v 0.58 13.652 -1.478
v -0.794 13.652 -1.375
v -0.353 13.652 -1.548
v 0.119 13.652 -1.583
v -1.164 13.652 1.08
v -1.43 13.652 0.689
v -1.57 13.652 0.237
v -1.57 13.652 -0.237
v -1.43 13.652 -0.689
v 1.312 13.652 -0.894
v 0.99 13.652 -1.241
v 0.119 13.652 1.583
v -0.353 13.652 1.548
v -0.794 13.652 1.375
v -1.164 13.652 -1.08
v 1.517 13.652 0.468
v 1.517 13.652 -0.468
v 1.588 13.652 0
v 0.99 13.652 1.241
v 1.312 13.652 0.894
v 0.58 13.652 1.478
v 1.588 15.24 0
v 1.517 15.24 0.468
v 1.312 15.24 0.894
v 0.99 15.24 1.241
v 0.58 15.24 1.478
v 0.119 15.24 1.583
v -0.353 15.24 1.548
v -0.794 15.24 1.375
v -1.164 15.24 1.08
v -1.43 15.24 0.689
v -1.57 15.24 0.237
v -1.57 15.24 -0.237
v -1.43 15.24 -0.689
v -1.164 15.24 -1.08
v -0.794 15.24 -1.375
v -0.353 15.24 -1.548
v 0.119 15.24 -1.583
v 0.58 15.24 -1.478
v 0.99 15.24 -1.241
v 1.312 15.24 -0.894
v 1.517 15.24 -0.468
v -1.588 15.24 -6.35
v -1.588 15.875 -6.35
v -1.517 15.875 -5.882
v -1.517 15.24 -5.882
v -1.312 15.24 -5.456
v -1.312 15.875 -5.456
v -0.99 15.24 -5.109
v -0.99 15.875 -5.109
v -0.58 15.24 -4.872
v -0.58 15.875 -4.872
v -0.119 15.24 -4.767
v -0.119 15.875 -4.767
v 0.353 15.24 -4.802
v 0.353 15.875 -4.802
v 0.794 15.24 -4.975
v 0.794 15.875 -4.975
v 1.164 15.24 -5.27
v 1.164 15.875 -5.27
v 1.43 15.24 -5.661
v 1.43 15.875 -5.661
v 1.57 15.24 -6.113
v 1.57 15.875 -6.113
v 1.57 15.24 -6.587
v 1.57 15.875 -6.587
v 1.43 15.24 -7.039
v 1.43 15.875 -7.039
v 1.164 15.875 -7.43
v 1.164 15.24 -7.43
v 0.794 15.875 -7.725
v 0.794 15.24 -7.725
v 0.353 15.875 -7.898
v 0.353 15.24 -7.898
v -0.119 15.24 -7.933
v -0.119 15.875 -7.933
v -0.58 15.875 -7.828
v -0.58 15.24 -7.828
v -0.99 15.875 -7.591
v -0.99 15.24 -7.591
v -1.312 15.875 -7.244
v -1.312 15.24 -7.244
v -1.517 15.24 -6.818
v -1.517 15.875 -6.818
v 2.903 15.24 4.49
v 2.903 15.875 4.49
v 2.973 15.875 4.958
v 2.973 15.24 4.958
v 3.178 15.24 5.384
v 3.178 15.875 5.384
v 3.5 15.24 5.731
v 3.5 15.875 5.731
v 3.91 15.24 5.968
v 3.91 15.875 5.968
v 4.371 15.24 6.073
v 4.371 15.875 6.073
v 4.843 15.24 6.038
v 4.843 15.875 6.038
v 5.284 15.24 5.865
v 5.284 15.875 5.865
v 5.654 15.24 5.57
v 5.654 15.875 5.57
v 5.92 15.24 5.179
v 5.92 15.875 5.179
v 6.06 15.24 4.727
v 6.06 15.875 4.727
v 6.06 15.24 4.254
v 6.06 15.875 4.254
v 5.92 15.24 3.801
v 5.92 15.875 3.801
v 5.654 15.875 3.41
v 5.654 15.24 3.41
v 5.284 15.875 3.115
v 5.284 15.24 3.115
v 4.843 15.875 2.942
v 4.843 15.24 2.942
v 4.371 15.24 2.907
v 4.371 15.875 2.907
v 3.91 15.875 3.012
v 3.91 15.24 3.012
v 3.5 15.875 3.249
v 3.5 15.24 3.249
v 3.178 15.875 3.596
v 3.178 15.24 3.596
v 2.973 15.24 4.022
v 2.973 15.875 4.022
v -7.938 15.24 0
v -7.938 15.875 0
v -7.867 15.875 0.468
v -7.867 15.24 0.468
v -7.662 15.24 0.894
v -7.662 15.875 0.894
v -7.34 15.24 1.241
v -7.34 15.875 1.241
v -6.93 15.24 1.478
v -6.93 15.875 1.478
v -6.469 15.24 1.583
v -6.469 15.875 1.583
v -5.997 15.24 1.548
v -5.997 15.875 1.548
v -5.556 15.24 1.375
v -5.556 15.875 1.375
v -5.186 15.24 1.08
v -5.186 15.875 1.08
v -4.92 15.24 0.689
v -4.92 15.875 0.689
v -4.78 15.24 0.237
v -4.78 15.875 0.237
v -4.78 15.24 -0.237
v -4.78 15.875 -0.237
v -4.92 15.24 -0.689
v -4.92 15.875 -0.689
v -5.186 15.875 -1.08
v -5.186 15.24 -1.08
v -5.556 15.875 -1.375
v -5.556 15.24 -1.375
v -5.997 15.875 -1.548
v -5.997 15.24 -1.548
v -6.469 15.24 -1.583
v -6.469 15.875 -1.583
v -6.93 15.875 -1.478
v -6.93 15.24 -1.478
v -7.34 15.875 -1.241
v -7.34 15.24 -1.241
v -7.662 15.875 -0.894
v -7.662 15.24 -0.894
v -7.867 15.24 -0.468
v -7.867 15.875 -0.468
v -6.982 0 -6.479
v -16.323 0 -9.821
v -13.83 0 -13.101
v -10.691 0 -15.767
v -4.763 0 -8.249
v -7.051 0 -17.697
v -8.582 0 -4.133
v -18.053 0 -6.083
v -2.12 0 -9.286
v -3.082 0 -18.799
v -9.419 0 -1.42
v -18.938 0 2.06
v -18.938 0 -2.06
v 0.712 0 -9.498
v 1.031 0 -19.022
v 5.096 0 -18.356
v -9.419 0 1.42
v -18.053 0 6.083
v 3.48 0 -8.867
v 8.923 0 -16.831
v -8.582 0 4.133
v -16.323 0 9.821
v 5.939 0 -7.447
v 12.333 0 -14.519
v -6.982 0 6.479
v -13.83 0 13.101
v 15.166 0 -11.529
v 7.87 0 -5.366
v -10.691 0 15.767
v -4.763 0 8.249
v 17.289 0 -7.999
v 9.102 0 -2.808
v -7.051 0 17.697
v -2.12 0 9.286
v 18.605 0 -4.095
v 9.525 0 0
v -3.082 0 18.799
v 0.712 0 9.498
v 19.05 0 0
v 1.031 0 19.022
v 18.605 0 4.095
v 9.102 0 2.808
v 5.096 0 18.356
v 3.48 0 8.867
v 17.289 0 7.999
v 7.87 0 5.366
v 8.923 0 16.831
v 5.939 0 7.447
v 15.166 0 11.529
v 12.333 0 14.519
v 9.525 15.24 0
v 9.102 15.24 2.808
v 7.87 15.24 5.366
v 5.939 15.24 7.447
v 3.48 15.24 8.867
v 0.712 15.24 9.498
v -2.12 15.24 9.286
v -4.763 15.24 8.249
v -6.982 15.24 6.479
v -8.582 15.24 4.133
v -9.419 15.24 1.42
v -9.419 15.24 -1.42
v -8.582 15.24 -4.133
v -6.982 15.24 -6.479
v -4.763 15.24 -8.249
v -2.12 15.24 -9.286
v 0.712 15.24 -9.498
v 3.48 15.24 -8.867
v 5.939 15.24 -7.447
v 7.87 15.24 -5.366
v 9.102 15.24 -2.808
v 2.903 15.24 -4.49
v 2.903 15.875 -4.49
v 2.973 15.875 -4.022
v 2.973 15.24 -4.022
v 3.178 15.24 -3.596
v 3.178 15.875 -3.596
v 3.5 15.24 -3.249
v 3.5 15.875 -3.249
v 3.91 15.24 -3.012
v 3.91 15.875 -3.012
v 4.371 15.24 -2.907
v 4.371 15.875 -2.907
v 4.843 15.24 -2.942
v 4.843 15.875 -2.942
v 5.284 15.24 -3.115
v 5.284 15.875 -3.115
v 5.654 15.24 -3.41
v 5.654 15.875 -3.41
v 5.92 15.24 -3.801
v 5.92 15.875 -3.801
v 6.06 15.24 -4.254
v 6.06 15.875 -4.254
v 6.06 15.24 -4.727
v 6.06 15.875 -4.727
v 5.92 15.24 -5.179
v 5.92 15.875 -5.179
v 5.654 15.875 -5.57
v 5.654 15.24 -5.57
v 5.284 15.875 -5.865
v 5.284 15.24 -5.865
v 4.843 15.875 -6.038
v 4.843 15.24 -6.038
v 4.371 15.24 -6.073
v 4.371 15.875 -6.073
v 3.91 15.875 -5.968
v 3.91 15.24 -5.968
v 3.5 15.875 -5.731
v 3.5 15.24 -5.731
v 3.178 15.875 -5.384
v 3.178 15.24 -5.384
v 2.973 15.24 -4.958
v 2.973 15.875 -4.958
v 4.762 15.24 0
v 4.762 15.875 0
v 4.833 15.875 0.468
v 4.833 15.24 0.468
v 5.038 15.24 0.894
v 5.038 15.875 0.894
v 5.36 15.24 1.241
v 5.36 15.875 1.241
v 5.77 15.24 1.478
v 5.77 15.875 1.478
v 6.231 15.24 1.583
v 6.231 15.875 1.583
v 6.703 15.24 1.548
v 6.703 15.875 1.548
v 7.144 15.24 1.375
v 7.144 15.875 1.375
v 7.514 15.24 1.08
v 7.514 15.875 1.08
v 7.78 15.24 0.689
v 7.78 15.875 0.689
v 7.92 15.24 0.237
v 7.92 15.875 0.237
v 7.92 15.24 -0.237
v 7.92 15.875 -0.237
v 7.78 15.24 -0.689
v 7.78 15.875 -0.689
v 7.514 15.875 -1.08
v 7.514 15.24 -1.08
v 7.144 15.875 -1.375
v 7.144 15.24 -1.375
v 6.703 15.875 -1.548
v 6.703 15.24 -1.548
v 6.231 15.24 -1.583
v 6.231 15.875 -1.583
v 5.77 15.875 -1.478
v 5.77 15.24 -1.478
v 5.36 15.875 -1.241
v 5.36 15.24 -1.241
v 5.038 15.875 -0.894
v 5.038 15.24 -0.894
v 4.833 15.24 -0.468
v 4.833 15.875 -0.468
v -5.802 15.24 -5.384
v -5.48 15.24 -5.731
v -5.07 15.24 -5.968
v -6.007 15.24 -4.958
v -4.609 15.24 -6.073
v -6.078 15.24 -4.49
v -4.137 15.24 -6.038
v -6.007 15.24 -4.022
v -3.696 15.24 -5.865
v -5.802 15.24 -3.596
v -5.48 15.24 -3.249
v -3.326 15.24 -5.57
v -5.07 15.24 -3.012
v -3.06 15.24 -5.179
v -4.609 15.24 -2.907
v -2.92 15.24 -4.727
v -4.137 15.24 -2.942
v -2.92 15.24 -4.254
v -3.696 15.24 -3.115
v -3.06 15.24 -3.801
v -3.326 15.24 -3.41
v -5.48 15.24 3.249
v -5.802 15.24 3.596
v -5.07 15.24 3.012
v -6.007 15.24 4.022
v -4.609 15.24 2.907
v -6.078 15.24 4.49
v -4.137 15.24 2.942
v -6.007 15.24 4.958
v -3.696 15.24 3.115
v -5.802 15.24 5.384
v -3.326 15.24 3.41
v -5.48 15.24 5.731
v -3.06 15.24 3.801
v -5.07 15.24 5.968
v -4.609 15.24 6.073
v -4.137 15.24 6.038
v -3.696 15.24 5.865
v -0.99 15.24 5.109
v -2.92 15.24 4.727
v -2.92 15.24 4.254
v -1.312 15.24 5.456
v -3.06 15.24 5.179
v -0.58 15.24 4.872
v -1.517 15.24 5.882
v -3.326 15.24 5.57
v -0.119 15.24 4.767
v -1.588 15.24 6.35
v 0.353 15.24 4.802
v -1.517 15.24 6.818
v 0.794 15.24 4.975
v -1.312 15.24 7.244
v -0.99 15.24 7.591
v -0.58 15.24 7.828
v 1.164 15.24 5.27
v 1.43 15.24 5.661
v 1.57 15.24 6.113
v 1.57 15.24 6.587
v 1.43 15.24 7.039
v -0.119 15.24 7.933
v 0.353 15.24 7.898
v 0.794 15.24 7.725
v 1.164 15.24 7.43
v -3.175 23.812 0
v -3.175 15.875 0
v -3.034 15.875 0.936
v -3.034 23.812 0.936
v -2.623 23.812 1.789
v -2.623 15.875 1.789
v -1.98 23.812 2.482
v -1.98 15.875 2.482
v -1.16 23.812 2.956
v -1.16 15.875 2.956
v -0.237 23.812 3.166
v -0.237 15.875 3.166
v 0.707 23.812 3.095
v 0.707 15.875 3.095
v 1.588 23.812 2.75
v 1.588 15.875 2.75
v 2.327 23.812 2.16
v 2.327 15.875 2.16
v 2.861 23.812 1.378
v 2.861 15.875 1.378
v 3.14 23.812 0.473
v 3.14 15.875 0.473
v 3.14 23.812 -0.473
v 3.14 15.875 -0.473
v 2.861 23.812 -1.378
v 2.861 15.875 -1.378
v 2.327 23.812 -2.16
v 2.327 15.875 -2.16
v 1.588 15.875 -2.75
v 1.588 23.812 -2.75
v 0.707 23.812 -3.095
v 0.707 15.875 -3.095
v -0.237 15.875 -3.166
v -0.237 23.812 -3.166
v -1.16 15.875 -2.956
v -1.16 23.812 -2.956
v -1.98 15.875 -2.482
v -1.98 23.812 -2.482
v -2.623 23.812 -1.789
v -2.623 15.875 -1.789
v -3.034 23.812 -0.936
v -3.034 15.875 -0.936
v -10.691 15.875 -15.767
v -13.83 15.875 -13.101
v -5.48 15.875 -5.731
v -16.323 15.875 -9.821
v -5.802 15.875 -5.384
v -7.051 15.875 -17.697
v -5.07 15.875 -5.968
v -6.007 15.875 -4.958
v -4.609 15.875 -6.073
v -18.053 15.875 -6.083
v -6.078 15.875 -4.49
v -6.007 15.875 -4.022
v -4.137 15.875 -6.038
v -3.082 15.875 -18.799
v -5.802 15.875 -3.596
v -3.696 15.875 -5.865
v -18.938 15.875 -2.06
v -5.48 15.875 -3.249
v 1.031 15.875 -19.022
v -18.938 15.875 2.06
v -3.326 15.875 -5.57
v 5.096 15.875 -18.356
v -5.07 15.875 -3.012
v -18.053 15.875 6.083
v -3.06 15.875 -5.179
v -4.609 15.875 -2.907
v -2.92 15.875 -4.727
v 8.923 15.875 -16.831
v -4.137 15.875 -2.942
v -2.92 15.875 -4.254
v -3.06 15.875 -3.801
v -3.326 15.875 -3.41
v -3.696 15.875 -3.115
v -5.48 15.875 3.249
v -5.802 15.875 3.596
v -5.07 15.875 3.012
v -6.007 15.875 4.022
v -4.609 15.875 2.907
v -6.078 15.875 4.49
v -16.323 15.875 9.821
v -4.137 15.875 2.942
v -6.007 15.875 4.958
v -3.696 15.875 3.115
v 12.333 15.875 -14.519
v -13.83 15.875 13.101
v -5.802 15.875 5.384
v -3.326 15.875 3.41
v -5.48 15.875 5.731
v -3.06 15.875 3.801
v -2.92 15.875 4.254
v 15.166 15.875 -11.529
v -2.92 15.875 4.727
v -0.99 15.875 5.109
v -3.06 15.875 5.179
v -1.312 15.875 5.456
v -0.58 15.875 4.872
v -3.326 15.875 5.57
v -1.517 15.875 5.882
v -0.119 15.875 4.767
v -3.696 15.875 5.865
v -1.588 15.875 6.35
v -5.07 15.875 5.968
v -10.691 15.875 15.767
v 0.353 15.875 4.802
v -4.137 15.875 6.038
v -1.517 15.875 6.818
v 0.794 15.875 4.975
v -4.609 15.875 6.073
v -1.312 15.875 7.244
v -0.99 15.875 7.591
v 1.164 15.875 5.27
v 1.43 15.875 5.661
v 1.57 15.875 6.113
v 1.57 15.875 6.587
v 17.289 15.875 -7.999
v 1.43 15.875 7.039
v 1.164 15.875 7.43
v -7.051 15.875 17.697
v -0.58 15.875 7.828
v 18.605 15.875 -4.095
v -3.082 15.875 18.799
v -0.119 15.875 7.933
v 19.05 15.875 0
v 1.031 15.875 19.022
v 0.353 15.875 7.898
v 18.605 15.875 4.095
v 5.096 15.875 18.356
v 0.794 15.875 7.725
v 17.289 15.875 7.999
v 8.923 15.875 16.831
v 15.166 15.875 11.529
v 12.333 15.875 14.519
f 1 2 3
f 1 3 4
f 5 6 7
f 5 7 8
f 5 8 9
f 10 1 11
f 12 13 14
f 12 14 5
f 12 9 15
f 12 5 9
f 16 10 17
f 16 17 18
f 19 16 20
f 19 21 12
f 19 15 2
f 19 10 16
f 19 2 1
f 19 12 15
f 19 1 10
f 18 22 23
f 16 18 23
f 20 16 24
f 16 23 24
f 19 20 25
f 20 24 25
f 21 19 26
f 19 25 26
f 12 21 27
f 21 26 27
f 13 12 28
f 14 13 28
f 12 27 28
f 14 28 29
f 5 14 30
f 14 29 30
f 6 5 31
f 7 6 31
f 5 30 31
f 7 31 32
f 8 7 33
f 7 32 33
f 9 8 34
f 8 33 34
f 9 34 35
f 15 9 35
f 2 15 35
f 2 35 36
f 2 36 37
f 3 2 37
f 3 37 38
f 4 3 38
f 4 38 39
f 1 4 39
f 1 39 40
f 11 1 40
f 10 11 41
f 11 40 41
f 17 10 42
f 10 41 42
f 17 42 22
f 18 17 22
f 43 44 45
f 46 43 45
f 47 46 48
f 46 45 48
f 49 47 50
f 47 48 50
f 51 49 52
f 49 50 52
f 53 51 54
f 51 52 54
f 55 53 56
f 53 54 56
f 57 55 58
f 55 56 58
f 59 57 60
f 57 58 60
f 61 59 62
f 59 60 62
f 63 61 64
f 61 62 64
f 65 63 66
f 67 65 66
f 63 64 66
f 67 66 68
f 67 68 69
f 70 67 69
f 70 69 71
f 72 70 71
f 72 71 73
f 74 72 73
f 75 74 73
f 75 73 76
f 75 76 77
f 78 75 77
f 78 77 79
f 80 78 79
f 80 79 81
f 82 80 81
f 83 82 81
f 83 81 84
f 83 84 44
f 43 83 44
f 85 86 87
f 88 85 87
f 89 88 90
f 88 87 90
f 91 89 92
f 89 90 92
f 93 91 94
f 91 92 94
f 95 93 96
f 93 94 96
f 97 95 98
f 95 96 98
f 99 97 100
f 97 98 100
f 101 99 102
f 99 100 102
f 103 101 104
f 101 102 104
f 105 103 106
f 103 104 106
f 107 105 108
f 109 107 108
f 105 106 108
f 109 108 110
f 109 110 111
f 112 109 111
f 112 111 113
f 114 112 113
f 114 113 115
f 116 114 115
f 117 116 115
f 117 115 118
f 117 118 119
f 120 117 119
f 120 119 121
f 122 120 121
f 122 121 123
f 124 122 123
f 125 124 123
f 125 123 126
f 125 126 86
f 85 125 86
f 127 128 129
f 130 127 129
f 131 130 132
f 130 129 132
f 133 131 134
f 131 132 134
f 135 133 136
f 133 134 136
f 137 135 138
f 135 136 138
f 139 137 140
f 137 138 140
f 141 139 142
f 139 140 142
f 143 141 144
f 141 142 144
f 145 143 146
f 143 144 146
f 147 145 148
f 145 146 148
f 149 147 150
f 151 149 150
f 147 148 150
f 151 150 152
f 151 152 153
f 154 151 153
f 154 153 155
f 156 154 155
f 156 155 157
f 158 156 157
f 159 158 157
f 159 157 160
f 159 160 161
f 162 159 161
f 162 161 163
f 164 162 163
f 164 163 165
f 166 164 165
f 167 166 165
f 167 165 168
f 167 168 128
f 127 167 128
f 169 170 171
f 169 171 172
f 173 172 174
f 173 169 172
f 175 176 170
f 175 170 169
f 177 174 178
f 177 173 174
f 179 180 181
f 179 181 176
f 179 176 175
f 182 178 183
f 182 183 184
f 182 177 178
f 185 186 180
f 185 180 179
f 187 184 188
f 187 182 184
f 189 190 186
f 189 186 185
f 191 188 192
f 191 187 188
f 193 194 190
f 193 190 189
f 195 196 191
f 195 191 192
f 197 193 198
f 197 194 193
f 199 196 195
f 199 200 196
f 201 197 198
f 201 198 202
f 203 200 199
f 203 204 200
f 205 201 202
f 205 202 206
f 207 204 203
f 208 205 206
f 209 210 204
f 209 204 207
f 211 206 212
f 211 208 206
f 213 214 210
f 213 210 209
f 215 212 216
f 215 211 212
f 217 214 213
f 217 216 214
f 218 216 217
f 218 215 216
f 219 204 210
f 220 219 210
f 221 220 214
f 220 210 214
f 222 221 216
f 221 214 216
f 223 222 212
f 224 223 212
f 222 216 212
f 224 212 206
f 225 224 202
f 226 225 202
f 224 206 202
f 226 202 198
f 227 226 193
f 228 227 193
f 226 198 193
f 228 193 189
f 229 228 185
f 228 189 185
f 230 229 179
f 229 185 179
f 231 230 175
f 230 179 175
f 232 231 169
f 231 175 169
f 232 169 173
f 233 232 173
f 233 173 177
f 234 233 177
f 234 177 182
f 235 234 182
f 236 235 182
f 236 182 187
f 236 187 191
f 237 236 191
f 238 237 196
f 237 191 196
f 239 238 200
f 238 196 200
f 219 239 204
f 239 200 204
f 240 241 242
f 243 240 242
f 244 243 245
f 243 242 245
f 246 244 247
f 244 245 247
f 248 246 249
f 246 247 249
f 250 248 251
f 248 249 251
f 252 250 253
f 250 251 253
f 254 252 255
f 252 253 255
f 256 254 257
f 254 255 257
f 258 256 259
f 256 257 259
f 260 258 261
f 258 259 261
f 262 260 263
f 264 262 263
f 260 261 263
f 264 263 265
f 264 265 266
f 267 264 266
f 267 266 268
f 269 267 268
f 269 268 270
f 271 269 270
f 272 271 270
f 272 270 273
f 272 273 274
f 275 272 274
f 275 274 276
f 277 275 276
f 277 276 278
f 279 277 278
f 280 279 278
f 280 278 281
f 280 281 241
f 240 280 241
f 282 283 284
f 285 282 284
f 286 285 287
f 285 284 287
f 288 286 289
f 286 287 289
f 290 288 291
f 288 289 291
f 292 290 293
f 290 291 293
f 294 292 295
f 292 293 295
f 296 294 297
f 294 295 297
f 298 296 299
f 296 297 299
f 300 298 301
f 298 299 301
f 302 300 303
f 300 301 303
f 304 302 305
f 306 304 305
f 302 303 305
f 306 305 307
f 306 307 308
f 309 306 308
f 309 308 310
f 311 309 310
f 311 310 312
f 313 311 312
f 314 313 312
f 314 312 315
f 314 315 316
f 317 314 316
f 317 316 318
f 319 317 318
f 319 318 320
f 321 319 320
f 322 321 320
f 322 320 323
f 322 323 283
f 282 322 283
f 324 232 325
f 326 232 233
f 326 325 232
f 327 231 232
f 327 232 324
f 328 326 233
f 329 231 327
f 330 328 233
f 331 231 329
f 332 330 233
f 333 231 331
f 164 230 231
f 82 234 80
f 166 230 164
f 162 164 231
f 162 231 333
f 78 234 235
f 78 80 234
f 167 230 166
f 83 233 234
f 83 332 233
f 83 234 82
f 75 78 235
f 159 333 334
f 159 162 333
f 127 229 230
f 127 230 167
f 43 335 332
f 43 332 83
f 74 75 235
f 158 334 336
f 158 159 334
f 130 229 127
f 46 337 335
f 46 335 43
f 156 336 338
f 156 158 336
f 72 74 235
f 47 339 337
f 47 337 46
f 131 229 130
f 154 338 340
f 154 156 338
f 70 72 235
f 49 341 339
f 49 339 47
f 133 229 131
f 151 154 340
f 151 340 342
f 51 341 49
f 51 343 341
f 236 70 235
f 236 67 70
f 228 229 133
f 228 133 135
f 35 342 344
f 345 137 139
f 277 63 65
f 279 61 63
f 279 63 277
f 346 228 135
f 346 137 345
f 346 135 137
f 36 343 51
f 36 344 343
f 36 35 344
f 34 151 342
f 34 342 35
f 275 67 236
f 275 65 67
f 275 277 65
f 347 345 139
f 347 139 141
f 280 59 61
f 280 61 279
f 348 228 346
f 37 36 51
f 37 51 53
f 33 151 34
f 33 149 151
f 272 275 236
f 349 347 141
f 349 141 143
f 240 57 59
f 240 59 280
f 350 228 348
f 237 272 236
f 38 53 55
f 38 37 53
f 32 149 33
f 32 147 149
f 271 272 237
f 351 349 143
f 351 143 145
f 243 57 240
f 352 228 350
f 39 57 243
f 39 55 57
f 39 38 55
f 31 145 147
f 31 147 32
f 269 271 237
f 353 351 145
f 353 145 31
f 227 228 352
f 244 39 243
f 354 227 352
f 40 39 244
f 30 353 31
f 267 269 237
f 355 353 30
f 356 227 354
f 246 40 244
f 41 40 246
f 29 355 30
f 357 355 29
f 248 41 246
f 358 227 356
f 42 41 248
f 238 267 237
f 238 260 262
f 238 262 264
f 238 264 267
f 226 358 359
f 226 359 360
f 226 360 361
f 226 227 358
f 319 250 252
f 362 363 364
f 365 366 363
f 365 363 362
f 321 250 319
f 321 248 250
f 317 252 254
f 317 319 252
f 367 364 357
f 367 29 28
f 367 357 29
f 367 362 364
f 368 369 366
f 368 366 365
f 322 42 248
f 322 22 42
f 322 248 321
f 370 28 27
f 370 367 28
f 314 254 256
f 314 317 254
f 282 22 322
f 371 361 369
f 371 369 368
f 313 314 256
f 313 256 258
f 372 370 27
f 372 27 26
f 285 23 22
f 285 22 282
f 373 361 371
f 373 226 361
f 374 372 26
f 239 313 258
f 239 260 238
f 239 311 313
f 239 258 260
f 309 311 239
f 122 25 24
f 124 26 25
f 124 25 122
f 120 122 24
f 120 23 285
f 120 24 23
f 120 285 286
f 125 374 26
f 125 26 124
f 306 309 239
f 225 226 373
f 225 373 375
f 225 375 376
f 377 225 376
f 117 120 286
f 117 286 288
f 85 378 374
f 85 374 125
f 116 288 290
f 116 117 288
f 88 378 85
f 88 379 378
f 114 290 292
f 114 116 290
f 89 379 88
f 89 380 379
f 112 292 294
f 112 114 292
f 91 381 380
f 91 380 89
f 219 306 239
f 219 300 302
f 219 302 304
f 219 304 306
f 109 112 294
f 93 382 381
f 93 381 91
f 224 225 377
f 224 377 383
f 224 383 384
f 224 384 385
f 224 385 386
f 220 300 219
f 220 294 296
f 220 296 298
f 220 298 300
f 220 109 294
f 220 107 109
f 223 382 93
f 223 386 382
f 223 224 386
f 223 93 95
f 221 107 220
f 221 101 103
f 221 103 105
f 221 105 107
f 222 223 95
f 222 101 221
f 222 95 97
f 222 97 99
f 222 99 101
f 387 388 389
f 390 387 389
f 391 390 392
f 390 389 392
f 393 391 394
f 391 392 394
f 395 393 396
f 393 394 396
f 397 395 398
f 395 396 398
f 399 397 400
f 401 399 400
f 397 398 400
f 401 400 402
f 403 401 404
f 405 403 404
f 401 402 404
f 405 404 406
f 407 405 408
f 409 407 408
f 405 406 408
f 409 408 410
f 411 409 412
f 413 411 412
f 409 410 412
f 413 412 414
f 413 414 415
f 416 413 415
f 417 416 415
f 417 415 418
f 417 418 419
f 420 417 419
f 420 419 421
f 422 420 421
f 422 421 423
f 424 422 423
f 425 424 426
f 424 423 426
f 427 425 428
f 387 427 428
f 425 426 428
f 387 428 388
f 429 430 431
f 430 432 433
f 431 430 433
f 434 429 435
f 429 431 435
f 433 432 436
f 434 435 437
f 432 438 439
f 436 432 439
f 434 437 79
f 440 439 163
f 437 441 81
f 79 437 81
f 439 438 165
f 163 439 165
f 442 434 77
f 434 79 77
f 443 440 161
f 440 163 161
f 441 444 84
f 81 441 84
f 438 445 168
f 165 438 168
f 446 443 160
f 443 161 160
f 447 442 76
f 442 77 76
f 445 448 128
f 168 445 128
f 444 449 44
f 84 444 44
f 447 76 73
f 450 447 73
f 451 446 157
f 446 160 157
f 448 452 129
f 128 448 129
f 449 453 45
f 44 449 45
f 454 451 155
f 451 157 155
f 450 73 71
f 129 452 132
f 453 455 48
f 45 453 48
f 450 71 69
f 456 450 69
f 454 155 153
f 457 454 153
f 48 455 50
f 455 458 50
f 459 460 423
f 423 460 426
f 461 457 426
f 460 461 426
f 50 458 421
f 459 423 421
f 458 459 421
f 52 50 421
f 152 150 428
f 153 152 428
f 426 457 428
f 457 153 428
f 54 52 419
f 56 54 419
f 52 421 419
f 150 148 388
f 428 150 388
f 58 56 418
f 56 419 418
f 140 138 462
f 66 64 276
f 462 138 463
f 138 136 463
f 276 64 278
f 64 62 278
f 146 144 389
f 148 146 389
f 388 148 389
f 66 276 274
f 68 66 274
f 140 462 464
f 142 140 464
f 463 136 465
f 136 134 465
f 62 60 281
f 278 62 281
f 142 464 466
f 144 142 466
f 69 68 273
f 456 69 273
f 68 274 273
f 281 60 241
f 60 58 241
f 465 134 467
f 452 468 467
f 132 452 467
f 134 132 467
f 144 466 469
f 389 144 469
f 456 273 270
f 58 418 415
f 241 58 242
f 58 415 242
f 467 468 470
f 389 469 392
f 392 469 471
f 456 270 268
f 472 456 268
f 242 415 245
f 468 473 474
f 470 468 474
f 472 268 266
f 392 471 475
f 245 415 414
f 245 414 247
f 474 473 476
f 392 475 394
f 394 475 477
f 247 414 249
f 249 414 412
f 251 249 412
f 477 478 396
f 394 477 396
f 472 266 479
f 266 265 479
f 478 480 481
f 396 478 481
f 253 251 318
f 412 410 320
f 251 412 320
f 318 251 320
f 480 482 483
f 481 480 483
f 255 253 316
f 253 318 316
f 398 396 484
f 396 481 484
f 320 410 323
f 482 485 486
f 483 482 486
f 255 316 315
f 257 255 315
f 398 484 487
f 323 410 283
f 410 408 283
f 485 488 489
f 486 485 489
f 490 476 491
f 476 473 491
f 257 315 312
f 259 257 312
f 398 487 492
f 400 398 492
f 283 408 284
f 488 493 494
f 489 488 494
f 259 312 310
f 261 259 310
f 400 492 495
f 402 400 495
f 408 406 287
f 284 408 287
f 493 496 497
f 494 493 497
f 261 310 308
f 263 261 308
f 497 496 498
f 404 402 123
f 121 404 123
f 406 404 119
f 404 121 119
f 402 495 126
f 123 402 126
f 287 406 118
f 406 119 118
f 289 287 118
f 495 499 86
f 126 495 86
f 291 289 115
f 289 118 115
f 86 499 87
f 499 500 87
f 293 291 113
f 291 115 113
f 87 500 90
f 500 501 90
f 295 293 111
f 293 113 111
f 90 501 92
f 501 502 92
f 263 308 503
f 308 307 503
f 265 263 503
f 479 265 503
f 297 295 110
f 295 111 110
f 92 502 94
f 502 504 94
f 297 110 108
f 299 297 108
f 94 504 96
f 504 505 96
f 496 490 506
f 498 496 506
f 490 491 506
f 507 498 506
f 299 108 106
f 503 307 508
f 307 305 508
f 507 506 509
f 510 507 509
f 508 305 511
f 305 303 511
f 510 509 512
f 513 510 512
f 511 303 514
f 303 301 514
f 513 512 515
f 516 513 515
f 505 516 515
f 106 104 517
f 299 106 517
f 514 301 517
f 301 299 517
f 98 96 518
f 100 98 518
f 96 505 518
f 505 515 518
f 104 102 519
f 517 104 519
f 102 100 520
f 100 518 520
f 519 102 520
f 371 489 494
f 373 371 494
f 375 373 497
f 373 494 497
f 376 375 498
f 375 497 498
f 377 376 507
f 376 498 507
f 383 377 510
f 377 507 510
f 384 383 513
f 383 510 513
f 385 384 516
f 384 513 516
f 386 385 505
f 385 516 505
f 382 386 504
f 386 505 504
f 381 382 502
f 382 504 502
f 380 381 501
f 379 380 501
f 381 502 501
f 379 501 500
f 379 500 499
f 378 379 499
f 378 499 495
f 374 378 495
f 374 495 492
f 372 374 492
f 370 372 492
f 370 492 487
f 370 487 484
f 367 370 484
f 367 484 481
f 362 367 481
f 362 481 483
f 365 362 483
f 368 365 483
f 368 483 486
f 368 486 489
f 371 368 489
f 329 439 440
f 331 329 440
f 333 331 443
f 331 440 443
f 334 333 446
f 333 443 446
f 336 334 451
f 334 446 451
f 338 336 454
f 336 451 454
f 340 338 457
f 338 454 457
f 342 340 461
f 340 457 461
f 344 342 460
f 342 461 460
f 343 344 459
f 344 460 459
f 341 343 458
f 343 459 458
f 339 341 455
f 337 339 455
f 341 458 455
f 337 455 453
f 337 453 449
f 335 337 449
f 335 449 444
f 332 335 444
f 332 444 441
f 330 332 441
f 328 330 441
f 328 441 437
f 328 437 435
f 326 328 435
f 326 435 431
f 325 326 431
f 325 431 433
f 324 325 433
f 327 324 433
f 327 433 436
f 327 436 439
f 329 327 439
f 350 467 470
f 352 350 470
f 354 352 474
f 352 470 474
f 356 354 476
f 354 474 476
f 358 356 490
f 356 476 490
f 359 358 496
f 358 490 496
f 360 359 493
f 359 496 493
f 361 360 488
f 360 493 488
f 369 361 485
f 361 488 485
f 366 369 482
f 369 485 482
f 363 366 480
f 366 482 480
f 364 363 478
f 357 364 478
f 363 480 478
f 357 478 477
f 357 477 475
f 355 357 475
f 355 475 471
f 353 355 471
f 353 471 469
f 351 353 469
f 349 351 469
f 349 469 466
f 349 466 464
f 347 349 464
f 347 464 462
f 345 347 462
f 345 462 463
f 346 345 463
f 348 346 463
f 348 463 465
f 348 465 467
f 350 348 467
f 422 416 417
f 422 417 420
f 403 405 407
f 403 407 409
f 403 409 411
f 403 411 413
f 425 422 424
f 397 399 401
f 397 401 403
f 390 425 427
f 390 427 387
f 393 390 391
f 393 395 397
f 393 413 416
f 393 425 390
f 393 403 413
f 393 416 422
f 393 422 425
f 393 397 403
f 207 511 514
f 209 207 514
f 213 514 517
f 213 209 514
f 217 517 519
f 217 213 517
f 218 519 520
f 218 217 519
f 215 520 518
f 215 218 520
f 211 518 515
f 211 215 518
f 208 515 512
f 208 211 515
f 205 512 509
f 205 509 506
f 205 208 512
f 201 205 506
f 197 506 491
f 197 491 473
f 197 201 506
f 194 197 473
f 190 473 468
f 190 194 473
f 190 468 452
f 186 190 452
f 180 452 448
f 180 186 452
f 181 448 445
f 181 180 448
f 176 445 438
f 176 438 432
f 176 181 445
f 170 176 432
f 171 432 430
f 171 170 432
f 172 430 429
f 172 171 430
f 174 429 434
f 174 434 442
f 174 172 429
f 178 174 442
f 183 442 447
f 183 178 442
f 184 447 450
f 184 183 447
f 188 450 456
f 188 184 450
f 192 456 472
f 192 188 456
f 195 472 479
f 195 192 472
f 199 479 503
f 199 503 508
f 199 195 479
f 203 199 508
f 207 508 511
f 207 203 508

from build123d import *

# Parameters (mm, degrees)
F0_R      = 19.05
F2_DEPTH  = 15.875
F1_R      = 9.525
F3_DEPTH  = 15.24
F4_R      = 1.5875
F5_DEPTH  = 1.5875
F6_R      = 3.175
F7_DEPTH  = 7.9375
F9_R      = 1.5875
F10_DEPTH = 25.4


with BuildPart() as f2:
    # F0 (on Front) → F2 (new body)
    with BuildSketch(Plane.XZ):
        Circle(F0_R)
    extrude(amount=-F2_DEPTH)

    # F1 (on face) → F3 (cut)
    with BuildSketch(Plane.XZ):
        Circle(F1_R)
    extrude(amount=-F3_DEPTH, mode=Mode.SUBTRACT)

    # F4 (on face) → F5 (join)
    with BuildSketch(Plane.XZ.offset(-15.24)):
        Circle(F4_R)
    extrude(amount=F5_DEPTH)

    # F6 (on face) → F7 (join)
    with BuildSketch(Plane(origin=(0, 15.875, 0), x_dir=(-1, 0, 0), z_dir=(0, 1, 0))):
        Circle(F6_R)
    extrude(amount=F7_DEPTH)

    # F9 (on face) → F10 (cut)
    with BuildSketch(Plane(origin=(0, 15.875, 0), x_dir=(-1, 0, 0), z_dir=(0, 1, 0))):
        with Locations((6.35, 0)):
            Circle(F9_R)
        with Locations((4.490128, 4.490128)):
            Circle(F9_R)
        with Locations((0, 6.35)):
            Circle(F9_R)
        with Locations((-4.490128, 4.490128)):
            Circle(F9_R)
        with Locations((-6.35, 0)):
            Circle(F9_R)
        with Locations((-4.490128, -4.490128)):
            Circle(F9_R)
        with Locations((0, -6.35)):
            Circle(F9_R)
        with Locations((4.490128, -4.490128)):
            Circle(F9_R)
    extrude(amount=-F10_DEPTH, mode=Mode.SUBTRACT)


solid = f2.part
